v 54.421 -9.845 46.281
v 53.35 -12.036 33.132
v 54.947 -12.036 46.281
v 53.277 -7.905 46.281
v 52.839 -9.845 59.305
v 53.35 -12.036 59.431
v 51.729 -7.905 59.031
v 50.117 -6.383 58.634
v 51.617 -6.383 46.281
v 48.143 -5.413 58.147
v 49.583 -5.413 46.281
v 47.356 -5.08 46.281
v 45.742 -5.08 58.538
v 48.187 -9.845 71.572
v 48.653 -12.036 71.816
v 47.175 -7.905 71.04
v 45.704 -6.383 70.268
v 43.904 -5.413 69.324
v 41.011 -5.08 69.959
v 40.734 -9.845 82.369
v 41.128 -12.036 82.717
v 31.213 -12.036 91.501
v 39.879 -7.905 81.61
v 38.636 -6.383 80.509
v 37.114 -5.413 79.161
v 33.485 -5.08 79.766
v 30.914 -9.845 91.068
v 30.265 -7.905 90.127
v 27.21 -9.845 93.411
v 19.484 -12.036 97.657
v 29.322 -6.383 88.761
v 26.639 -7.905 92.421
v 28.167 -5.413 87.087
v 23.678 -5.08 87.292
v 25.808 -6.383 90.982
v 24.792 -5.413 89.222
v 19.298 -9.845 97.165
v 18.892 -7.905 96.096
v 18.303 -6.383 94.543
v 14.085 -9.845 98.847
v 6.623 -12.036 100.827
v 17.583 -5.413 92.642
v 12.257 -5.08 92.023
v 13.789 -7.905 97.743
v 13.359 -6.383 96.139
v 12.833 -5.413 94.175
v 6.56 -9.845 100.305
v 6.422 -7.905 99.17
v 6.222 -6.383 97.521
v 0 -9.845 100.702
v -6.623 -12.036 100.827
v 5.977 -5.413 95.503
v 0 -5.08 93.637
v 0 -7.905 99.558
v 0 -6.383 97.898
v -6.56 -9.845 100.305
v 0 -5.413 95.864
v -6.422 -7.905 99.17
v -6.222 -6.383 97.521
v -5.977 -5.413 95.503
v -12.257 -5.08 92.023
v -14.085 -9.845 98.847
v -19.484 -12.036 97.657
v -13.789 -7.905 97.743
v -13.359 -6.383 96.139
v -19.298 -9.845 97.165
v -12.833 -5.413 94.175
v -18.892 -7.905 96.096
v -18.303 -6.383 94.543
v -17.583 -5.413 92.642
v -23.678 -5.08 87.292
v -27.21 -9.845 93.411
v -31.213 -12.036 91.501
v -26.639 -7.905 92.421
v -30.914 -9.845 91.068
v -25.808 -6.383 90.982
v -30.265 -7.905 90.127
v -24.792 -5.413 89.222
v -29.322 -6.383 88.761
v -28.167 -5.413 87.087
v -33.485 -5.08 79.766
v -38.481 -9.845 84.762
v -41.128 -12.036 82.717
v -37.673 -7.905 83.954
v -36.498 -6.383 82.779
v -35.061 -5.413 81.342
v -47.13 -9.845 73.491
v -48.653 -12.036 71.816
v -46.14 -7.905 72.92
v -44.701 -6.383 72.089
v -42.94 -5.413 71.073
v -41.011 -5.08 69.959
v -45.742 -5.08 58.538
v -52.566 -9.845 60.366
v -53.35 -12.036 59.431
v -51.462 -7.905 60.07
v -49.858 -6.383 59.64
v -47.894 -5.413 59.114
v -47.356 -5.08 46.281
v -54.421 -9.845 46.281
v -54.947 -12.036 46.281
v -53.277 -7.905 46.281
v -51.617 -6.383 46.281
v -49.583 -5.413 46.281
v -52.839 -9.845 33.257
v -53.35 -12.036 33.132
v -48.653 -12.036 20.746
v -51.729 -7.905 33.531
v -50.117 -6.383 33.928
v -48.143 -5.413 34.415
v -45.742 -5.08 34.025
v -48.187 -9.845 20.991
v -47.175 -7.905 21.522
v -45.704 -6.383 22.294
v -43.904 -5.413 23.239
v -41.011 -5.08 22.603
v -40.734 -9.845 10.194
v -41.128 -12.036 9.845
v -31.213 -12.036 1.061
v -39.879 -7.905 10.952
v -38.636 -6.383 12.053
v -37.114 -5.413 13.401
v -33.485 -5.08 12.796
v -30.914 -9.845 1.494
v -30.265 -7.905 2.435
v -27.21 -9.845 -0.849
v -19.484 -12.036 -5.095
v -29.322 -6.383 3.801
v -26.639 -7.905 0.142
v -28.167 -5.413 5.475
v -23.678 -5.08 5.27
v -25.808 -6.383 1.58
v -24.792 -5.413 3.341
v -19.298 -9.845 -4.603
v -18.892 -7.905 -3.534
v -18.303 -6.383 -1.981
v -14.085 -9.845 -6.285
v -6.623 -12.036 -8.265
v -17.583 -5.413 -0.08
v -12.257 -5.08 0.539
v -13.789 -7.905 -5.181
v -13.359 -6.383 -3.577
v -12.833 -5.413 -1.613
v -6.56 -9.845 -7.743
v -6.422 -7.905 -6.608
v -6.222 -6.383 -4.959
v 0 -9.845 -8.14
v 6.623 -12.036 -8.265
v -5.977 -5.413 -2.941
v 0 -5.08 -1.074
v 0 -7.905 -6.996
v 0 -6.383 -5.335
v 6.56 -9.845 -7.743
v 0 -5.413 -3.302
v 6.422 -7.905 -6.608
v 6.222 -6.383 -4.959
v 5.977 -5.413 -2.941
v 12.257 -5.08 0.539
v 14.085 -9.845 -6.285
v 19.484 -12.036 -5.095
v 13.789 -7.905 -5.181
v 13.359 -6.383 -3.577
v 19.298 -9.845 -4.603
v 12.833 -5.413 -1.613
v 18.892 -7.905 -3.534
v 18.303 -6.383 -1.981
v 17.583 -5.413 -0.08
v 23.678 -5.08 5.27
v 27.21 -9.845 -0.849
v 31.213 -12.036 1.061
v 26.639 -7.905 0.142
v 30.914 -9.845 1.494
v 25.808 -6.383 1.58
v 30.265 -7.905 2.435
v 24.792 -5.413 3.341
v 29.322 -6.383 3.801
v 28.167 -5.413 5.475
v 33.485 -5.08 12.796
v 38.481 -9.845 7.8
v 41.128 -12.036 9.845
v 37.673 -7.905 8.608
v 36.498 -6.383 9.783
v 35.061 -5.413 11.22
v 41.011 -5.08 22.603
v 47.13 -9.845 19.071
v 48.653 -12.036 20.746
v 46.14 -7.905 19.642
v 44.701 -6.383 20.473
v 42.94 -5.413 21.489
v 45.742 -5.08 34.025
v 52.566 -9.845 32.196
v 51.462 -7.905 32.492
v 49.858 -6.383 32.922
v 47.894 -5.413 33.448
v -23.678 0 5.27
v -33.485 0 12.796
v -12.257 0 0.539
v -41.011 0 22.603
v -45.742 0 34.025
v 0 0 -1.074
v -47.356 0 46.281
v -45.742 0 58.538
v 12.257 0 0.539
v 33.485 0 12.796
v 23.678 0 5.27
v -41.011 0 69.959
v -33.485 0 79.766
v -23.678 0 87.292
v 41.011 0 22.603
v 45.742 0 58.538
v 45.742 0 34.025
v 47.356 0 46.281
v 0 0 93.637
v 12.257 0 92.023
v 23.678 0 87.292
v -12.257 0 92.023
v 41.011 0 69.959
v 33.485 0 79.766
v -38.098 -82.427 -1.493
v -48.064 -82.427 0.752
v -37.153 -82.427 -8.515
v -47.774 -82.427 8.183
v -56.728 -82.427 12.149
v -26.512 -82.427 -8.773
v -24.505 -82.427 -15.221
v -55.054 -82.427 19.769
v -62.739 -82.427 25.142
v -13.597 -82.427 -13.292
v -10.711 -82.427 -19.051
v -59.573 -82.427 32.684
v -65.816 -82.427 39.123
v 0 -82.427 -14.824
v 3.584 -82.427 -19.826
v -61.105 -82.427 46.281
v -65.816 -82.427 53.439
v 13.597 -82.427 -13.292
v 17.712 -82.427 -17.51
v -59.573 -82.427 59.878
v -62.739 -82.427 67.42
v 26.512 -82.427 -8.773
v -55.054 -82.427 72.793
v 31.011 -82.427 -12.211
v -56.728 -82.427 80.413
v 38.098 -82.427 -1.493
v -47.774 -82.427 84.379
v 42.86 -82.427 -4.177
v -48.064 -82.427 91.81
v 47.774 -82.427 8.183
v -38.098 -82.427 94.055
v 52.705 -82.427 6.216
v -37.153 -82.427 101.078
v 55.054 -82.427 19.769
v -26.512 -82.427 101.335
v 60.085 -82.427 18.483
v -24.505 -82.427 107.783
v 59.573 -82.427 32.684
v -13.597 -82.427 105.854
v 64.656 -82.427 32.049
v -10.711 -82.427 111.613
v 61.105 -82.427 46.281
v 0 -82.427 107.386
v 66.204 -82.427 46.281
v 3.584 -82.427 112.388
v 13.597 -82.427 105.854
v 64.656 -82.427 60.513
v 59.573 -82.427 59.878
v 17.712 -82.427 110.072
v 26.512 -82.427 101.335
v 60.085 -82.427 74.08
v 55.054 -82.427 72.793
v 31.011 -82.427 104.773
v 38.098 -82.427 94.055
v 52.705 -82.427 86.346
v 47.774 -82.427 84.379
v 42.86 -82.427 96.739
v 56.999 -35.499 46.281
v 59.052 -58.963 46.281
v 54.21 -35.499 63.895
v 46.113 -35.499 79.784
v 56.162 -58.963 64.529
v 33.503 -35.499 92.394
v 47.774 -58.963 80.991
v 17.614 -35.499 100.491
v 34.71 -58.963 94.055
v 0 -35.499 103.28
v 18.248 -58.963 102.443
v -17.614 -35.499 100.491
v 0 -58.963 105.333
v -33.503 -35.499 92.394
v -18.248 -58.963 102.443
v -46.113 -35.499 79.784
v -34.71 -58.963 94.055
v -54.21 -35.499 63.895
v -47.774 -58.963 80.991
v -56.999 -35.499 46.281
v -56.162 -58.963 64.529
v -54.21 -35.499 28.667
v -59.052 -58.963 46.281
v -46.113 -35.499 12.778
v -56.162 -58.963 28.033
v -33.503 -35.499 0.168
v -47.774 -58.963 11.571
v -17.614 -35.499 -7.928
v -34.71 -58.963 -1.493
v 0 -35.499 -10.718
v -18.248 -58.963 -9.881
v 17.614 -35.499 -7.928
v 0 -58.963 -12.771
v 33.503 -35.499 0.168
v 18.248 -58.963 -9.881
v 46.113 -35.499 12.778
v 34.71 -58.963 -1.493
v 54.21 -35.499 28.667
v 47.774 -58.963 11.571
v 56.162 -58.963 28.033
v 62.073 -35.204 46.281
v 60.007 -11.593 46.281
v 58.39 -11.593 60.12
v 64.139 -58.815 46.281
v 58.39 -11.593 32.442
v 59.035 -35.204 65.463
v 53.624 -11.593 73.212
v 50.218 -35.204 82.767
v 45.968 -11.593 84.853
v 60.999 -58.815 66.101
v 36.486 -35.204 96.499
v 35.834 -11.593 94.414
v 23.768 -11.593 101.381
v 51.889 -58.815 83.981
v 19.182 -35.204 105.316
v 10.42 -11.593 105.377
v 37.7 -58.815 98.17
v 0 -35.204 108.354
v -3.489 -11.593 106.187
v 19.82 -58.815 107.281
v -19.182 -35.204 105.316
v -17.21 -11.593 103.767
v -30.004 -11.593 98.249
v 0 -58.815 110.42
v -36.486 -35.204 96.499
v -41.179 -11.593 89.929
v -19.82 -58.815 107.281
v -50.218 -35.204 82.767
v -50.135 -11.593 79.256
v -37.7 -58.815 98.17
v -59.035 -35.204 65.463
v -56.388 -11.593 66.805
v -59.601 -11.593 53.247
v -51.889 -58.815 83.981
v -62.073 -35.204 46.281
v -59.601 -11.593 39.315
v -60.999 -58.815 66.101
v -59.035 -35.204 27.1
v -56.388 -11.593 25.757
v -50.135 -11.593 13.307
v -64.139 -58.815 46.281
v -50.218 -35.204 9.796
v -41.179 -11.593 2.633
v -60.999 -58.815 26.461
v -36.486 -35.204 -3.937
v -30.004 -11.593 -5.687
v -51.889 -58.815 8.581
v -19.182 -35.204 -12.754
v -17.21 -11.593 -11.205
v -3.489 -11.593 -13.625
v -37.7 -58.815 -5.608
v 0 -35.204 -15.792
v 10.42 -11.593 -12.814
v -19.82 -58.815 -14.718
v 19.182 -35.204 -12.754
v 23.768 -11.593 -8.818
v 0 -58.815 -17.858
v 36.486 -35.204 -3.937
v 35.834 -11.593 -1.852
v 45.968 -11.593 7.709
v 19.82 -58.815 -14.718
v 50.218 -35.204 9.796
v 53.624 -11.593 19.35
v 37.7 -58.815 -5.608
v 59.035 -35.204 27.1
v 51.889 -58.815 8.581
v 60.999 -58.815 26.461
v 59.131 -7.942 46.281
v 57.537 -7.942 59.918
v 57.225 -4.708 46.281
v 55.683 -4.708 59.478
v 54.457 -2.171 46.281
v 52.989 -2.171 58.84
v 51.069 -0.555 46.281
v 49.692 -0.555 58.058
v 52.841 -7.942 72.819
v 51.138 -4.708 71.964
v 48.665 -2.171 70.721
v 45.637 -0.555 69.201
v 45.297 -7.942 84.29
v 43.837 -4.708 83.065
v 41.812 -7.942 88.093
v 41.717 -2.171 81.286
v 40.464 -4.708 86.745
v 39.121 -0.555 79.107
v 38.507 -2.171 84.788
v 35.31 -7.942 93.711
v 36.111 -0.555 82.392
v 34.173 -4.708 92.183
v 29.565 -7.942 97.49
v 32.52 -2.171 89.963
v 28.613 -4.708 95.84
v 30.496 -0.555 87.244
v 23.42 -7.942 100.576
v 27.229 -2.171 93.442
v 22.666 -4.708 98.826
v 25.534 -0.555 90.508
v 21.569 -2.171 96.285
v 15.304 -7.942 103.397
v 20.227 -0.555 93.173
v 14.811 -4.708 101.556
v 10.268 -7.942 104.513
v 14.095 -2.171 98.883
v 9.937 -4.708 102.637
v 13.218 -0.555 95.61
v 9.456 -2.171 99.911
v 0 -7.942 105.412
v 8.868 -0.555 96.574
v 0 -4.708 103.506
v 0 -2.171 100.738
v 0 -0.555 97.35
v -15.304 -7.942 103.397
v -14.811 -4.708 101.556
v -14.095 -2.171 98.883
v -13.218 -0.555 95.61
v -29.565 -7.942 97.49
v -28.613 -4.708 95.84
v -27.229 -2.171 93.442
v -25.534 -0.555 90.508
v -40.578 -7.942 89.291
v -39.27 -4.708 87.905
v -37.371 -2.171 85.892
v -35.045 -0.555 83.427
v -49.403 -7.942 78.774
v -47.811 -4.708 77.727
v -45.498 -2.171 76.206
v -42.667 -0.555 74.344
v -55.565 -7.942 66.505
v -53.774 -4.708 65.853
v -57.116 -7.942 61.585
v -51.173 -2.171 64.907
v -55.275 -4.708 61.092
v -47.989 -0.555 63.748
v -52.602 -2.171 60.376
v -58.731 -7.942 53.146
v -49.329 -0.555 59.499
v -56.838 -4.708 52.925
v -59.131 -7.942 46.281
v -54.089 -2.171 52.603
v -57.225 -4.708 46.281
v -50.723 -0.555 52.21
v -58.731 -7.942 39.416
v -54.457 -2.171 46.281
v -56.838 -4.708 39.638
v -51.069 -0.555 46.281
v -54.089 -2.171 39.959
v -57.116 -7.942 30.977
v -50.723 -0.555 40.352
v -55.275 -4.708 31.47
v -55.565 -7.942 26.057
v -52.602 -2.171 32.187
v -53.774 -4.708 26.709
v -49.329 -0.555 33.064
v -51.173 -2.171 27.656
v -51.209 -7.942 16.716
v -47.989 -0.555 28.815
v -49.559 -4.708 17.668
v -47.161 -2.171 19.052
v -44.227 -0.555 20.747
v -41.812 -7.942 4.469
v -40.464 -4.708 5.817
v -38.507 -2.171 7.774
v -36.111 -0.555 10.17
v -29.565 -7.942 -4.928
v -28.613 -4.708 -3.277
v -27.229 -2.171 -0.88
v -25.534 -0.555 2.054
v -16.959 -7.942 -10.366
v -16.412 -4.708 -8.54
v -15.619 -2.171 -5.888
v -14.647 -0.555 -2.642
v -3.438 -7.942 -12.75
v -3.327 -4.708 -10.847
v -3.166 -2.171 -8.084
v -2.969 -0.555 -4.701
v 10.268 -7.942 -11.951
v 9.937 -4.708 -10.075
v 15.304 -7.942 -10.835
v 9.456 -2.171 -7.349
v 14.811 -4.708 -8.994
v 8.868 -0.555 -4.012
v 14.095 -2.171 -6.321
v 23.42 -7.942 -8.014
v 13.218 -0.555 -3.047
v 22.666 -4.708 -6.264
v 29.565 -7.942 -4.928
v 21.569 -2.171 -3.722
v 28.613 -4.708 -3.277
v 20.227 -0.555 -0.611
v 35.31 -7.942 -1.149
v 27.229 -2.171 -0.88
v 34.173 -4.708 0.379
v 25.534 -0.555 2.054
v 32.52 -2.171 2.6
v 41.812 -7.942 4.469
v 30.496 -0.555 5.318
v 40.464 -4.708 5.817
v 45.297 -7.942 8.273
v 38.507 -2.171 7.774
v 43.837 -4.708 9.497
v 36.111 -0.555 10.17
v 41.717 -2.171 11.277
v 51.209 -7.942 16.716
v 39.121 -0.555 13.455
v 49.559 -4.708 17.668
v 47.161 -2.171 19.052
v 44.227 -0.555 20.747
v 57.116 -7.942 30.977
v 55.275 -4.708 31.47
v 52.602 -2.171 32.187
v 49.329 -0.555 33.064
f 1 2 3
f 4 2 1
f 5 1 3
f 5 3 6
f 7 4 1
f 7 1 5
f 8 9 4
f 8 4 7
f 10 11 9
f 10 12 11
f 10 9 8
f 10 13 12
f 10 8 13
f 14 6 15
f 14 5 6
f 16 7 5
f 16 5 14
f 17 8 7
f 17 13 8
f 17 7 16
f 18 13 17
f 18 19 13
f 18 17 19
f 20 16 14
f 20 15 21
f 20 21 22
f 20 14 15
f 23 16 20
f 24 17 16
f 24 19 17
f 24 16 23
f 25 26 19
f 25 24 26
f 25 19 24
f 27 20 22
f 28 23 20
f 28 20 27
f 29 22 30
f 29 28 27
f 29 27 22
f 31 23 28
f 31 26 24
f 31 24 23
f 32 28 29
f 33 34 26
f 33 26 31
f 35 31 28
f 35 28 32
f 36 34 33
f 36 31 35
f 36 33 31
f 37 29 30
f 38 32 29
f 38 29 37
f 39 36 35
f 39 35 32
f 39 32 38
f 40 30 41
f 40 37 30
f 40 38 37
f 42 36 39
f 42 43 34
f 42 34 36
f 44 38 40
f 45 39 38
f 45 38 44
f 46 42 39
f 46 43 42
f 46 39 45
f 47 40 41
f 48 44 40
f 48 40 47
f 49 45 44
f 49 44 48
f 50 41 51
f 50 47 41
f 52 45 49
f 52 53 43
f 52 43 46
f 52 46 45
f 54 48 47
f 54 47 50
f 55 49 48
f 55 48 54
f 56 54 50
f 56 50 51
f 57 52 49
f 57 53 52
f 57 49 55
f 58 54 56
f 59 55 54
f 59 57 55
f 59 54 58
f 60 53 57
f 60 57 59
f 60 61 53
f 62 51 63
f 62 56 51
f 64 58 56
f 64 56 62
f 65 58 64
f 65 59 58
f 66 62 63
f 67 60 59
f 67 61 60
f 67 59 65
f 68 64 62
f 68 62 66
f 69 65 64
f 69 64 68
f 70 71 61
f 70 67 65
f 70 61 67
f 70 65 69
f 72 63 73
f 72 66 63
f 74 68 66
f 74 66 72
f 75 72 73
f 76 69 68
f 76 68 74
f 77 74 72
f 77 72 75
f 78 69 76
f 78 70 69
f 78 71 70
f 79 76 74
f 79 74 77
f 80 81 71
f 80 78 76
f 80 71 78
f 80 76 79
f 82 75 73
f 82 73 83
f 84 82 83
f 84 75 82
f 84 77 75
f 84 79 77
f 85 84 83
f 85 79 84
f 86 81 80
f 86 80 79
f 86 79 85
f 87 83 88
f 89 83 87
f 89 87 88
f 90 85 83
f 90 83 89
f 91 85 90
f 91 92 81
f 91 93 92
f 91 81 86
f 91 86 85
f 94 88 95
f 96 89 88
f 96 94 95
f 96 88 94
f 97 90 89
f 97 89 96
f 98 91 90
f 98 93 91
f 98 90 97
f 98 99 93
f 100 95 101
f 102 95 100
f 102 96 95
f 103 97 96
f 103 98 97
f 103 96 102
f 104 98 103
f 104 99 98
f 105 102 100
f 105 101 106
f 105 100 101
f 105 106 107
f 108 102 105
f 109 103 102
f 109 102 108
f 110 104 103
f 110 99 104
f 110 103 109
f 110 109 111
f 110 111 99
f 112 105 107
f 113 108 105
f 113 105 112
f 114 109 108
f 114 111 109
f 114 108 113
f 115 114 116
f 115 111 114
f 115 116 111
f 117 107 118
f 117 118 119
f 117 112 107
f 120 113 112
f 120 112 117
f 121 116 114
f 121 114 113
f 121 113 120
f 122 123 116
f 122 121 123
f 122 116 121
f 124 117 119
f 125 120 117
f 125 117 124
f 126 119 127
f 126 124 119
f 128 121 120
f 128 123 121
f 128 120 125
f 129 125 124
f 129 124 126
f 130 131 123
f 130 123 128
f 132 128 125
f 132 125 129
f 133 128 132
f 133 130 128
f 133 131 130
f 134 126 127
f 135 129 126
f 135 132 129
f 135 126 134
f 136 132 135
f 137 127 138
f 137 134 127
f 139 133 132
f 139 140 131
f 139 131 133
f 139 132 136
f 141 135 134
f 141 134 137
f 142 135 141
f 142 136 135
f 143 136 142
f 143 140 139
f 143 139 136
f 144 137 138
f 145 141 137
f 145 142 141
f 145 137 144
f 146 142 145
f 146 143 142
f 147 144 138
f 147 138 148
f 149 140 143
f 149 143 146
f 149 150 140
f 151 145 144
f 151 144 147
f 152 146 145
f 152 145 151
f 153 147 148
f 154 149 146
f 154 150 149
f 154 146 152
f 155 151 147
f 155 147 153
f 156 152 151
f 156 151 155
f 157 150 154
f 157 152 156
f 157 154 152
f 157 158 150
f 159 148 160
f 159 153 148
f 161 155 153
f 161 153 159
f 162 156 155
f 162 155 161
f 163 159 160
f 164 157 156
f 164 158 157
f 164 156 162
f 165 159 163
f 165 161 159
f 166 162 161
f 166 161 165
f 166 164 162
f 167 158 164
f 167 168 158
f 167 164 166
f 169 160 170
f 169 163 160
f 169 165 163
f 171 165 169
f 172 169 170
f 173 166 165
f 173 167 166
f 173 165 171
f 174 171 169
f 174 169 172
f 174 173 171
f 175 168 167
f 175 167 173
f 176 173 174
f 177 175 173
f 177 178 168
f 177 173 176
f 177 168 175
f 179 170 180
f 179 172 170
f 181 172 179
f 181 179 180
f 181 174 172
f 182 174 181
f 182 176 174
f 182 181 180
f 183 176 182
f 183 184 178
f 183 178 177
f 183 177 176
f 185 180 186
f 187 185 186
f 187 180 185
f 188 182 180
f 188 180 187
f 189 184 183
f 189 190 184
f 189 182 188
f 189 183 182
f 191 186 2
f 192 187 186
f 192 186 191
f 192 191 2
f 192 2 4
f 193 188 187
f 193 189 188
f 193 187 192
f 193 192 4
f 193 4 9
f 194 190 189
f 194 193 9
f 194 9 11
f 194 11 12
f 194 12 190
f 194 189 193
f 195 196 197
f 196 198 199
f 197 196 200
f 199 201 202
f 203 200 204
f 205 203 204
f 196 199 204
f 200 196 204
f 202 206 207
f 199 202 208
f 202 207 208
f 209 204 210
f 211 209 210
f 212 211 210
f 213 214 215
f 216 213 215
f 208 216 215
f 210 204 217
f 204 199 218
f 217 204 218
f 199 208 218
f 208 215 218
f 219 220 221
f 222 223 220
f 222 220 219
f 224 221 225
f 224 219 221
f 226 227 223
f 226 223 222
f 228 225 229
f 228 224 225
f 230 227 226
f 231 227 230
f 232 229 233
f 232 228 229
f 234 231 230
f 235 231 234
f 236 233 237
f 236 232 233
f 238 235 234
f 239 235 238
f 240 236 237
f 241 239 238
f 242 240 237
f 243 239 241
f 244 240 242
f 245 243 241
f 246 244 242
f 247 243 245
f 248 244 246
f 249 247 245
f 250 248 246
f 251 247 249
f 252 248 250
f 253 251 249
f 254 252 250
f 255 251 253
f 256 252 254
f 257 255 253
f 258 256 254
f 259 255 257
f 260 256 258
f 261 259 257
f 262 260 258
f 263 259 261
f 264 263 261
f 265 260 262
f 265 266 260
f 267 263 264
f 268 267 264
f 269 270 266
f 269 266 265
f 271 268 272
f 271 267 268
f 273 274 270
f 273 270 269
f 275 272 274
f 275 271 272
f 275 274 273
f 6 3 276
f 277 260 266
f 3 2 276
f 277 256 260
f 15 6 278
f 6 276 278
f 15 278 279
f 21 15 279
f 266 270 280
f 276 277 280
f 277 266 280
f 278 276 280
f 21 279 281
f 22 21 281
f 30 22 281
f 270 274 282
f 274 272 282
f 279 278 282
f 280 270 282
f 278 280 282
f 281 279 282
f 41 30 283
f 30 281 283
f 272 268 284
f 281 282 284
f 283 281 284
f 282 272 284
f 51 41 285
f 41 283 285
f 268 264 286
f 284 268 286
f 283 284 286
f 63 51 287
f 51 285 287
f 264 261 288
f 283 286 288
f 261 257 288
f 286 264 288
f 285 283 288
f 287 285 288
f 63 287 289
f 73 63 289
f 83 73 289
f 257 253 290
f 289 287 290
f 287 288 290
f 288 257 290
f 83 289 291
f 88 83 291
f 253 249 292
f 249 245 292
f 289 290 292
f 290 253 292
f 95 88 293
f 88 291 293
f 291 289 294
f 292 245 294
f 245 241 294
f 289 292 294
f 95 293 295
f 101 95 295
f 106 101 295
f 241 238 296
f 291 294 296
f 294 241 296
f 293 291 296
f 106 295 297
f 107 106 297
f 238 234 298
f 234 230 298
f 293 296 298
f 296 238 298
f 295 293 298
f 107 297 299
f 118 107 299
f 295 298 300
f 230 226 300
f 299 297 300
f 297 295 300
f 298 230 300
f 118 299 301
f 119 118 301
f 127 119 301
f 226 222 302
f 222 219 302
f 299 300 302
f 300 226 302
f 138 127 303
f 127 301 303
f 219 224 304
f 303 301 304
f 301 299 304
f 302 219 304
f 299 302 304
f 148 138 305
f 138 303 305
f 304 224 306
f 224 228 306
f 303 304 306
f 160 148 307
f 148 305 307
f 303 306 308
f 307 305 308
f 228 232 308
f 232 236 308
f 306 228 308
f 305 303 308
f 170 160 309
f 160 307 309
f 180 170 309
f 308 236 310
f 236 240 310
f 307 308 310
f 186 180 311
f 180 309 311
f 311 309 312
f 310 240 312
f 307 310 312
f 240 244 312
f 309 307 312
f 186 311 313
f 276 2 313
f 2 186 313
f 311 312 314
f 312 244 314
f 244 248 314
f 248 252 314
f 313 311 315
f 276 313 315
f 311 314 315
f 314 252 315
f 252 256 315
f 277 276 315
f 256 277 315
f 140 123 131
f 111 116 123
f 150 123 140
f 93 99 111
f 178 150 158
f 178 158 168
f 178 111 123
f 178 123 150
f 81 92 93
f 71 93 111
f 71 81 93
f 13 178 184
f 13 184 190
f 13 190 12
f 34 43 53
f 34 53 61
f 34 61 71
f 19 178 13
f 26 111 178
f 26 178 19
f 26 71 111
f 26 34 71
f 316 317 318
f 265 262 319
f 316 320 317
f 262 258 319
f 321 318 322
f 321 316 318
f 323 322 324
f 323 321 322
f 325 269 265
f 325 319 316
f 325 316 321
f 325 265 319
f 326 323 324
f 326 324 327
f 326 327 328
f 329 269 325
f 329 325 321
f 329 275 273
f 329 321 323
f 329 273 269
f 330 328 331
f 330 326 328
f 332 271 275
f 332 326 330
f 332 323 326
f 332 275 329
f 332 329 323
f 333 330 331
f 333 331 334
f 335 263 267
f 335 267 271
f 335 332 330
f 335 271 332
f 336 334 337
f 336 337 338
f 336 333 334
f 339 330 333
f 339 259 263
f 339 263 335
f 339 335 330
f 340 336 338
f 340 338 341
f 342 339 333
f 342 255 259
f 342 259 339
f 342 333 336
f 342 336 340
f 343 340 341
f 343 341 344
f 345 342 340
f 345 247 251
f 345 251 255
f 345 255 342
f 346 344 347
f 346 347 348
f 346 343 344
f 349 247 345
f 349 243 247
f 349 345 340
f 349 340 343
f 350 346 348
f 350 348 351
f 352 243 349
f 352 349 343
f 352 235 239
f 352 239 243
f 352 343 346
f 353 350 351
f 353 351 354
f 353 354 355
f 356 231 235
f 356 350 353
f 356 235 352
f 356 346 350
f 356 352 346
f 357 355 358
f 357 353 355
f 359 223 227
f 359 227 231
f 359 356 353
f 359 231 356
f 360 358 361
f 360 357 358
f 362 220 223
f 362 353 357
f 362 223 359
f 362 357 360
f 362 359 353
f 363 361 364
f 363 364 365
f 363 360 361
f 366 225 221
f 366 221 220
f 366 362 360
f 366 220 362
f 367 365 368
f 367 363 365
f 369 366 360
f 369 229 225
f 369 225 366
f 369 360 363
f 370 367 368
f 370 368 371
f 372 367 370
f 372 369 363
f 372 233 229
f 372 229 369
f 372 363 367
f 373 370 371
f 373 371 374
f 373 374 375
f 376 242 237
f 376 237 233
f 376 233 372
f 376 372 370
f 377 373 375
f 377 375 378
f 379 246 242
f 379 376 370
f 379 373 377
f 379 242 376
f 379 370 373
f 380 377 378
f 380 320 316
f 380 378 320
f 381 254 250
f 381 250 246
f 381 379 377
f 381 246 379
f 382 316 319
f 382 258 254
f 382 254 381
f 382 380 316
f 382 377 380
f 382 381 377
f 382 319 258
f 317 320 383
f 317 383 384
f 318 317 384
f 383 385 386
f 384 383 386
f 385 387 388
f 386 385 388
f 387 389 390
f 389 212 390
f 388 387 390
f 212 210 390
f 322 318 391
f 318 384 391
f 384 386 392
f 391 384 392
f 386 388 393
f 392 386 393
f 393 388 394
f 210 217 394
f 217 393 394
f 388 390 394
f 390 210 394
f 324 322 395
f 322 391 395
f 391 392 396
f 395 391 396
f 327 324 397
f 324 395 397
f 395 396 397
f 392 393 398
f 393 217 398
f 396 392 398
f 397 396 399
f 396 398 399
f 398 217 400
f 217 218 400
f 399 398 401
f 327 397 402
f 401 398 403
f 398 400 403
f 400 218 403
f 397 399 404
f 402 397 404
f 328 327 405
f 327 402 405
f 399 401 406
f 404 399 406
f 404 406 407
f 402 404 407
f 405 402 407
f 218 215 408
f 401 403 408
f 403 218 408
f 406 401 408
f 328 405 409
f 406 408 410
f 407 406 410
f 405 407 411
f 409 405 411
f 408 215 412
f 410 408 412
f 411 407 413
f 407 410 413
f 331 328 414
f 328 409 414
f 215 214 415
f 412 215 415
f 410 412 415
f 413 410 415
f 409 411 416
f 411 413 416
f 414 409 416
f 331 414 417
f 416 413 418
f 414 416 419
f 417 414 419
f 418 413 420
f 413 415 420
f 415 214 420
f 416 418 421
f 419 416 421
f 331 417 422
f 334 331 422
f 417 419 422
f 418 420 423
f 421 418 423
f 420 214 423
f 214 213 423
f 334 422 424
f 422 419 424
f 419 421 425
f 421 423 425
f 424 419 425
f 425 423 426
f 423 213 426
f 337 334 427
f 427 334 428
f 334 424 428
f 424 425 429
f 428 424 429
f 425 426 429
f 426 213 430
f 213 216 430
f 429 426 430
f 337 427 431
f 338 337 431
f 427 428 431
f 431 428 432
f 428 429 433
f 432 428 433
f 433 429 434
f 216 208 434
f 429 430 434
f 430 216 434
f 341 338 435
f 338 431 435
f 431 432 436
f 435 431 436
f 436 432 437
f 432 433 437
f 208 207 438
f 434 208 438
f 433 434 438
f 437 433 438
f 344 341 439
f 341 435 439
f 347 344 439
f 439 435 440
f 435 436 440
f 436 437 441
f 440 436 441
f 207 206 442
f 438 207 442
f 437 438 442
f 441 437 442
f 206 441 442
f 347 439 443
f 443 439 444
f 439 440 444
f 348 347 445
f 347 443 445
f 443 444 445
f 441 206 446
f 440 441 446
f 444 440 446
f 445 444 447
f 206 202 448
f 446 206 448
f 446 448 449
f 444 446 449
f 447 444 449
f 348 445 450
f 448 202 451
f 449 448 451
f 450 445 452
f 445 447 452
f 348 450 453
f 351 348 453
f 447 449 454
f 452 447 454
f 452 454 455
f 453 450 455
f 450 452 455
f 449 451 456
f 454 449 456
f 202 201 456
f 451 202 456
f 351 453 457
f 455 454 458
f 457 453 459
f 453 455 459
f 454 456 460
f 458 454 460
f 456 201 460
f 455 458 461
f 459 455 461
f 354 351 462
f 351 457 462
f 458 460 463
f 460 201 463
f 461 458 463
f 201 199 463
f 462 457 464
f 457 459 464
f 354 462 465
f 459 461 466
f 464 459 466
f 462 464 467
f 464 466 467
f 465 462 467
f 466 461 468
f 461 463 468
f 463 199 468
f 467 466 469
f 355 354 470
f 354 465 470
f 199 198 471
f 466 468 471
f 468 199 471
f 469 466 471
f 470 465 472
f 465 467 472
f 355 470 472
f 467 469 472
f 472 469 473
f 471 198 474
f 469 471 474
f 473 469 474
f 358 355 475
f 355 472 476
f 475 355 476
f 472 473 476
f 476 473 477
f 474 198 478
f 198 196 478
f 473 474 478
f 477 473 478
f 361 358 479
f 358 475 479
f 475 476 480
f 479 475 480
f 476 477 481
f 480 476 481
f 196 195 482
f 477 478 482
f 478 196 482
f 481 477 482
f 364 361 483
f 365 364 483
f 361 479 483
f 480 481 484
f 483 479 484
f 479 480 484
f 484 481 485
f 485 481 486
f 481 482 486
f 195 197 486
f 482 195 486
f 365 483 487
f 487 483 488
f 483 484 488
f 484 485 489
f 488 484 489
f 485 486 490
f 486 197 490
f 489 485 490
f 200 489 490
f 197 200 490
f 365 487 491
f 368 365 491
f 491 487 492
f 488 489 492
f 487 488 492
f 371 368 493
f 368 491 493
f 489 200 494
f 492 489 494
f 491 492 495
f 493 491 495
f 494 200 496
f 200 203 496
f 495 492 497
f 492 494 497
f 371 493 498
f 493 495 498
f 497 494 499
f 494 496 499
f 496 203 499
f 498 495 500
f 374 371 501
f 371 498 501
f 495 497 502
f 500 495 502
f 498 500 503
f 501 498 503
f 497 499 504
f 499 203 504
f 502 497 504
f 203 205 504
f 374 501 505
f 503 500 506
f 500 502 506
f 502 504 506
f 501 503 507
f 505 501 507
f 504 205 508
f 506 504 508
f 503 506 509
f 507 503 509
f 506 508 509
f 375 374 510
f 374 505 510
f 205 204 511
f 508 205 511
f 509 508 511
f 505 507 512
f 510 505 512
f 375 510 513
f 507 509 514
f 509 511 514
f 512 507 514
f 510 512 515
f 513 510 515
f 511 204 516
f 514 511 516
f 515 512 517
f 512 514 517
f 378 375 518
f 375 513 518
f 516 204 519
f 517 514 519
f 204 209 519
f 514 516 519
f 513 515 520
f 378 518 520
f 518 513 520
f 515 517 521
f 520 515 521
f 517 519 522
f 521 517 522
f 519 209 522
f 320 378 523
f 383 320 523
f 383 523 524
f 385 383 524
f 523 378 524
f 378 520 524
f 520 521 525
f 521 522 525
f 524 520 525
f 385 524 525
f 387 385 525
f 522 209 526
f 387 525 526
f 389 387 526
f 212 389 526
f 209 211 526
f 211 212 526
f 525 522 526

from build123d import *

# Parameters (mm, degrees)
F0_R     = 58.9929104122
F4_DEPTH = 82.4266280979
F4_TAPER = -5
F1_R     = 12.7
F2_T     = -5.08


with BuildPart() as f4:
    # F0 (on Front) → F4 (new body)
    with BuildSketch(Plane.XZ):
        with Locations((0, 46.2810769677)):
            Circle(F0_R)
    extrude(amount=F4_DEPTH, taper=F4_TAPER)

    # F1
    f1_edges = [f4.edges().sort_by_distance(p)[0] for p in [
        (-58.99291, 0, 46.281077),
    ]]
    fillet(f1_edges, radius=F1_R)

    # F2
    f2_openings = [f4.faces().sort_by_distance(p)[0] for p in [
        (0, -82.426628, 46.281077),
    ]]
    offset(amount=F2_T, openings=f2_openings, kind=Kind.INTERSECTION)


solid = f4.part
